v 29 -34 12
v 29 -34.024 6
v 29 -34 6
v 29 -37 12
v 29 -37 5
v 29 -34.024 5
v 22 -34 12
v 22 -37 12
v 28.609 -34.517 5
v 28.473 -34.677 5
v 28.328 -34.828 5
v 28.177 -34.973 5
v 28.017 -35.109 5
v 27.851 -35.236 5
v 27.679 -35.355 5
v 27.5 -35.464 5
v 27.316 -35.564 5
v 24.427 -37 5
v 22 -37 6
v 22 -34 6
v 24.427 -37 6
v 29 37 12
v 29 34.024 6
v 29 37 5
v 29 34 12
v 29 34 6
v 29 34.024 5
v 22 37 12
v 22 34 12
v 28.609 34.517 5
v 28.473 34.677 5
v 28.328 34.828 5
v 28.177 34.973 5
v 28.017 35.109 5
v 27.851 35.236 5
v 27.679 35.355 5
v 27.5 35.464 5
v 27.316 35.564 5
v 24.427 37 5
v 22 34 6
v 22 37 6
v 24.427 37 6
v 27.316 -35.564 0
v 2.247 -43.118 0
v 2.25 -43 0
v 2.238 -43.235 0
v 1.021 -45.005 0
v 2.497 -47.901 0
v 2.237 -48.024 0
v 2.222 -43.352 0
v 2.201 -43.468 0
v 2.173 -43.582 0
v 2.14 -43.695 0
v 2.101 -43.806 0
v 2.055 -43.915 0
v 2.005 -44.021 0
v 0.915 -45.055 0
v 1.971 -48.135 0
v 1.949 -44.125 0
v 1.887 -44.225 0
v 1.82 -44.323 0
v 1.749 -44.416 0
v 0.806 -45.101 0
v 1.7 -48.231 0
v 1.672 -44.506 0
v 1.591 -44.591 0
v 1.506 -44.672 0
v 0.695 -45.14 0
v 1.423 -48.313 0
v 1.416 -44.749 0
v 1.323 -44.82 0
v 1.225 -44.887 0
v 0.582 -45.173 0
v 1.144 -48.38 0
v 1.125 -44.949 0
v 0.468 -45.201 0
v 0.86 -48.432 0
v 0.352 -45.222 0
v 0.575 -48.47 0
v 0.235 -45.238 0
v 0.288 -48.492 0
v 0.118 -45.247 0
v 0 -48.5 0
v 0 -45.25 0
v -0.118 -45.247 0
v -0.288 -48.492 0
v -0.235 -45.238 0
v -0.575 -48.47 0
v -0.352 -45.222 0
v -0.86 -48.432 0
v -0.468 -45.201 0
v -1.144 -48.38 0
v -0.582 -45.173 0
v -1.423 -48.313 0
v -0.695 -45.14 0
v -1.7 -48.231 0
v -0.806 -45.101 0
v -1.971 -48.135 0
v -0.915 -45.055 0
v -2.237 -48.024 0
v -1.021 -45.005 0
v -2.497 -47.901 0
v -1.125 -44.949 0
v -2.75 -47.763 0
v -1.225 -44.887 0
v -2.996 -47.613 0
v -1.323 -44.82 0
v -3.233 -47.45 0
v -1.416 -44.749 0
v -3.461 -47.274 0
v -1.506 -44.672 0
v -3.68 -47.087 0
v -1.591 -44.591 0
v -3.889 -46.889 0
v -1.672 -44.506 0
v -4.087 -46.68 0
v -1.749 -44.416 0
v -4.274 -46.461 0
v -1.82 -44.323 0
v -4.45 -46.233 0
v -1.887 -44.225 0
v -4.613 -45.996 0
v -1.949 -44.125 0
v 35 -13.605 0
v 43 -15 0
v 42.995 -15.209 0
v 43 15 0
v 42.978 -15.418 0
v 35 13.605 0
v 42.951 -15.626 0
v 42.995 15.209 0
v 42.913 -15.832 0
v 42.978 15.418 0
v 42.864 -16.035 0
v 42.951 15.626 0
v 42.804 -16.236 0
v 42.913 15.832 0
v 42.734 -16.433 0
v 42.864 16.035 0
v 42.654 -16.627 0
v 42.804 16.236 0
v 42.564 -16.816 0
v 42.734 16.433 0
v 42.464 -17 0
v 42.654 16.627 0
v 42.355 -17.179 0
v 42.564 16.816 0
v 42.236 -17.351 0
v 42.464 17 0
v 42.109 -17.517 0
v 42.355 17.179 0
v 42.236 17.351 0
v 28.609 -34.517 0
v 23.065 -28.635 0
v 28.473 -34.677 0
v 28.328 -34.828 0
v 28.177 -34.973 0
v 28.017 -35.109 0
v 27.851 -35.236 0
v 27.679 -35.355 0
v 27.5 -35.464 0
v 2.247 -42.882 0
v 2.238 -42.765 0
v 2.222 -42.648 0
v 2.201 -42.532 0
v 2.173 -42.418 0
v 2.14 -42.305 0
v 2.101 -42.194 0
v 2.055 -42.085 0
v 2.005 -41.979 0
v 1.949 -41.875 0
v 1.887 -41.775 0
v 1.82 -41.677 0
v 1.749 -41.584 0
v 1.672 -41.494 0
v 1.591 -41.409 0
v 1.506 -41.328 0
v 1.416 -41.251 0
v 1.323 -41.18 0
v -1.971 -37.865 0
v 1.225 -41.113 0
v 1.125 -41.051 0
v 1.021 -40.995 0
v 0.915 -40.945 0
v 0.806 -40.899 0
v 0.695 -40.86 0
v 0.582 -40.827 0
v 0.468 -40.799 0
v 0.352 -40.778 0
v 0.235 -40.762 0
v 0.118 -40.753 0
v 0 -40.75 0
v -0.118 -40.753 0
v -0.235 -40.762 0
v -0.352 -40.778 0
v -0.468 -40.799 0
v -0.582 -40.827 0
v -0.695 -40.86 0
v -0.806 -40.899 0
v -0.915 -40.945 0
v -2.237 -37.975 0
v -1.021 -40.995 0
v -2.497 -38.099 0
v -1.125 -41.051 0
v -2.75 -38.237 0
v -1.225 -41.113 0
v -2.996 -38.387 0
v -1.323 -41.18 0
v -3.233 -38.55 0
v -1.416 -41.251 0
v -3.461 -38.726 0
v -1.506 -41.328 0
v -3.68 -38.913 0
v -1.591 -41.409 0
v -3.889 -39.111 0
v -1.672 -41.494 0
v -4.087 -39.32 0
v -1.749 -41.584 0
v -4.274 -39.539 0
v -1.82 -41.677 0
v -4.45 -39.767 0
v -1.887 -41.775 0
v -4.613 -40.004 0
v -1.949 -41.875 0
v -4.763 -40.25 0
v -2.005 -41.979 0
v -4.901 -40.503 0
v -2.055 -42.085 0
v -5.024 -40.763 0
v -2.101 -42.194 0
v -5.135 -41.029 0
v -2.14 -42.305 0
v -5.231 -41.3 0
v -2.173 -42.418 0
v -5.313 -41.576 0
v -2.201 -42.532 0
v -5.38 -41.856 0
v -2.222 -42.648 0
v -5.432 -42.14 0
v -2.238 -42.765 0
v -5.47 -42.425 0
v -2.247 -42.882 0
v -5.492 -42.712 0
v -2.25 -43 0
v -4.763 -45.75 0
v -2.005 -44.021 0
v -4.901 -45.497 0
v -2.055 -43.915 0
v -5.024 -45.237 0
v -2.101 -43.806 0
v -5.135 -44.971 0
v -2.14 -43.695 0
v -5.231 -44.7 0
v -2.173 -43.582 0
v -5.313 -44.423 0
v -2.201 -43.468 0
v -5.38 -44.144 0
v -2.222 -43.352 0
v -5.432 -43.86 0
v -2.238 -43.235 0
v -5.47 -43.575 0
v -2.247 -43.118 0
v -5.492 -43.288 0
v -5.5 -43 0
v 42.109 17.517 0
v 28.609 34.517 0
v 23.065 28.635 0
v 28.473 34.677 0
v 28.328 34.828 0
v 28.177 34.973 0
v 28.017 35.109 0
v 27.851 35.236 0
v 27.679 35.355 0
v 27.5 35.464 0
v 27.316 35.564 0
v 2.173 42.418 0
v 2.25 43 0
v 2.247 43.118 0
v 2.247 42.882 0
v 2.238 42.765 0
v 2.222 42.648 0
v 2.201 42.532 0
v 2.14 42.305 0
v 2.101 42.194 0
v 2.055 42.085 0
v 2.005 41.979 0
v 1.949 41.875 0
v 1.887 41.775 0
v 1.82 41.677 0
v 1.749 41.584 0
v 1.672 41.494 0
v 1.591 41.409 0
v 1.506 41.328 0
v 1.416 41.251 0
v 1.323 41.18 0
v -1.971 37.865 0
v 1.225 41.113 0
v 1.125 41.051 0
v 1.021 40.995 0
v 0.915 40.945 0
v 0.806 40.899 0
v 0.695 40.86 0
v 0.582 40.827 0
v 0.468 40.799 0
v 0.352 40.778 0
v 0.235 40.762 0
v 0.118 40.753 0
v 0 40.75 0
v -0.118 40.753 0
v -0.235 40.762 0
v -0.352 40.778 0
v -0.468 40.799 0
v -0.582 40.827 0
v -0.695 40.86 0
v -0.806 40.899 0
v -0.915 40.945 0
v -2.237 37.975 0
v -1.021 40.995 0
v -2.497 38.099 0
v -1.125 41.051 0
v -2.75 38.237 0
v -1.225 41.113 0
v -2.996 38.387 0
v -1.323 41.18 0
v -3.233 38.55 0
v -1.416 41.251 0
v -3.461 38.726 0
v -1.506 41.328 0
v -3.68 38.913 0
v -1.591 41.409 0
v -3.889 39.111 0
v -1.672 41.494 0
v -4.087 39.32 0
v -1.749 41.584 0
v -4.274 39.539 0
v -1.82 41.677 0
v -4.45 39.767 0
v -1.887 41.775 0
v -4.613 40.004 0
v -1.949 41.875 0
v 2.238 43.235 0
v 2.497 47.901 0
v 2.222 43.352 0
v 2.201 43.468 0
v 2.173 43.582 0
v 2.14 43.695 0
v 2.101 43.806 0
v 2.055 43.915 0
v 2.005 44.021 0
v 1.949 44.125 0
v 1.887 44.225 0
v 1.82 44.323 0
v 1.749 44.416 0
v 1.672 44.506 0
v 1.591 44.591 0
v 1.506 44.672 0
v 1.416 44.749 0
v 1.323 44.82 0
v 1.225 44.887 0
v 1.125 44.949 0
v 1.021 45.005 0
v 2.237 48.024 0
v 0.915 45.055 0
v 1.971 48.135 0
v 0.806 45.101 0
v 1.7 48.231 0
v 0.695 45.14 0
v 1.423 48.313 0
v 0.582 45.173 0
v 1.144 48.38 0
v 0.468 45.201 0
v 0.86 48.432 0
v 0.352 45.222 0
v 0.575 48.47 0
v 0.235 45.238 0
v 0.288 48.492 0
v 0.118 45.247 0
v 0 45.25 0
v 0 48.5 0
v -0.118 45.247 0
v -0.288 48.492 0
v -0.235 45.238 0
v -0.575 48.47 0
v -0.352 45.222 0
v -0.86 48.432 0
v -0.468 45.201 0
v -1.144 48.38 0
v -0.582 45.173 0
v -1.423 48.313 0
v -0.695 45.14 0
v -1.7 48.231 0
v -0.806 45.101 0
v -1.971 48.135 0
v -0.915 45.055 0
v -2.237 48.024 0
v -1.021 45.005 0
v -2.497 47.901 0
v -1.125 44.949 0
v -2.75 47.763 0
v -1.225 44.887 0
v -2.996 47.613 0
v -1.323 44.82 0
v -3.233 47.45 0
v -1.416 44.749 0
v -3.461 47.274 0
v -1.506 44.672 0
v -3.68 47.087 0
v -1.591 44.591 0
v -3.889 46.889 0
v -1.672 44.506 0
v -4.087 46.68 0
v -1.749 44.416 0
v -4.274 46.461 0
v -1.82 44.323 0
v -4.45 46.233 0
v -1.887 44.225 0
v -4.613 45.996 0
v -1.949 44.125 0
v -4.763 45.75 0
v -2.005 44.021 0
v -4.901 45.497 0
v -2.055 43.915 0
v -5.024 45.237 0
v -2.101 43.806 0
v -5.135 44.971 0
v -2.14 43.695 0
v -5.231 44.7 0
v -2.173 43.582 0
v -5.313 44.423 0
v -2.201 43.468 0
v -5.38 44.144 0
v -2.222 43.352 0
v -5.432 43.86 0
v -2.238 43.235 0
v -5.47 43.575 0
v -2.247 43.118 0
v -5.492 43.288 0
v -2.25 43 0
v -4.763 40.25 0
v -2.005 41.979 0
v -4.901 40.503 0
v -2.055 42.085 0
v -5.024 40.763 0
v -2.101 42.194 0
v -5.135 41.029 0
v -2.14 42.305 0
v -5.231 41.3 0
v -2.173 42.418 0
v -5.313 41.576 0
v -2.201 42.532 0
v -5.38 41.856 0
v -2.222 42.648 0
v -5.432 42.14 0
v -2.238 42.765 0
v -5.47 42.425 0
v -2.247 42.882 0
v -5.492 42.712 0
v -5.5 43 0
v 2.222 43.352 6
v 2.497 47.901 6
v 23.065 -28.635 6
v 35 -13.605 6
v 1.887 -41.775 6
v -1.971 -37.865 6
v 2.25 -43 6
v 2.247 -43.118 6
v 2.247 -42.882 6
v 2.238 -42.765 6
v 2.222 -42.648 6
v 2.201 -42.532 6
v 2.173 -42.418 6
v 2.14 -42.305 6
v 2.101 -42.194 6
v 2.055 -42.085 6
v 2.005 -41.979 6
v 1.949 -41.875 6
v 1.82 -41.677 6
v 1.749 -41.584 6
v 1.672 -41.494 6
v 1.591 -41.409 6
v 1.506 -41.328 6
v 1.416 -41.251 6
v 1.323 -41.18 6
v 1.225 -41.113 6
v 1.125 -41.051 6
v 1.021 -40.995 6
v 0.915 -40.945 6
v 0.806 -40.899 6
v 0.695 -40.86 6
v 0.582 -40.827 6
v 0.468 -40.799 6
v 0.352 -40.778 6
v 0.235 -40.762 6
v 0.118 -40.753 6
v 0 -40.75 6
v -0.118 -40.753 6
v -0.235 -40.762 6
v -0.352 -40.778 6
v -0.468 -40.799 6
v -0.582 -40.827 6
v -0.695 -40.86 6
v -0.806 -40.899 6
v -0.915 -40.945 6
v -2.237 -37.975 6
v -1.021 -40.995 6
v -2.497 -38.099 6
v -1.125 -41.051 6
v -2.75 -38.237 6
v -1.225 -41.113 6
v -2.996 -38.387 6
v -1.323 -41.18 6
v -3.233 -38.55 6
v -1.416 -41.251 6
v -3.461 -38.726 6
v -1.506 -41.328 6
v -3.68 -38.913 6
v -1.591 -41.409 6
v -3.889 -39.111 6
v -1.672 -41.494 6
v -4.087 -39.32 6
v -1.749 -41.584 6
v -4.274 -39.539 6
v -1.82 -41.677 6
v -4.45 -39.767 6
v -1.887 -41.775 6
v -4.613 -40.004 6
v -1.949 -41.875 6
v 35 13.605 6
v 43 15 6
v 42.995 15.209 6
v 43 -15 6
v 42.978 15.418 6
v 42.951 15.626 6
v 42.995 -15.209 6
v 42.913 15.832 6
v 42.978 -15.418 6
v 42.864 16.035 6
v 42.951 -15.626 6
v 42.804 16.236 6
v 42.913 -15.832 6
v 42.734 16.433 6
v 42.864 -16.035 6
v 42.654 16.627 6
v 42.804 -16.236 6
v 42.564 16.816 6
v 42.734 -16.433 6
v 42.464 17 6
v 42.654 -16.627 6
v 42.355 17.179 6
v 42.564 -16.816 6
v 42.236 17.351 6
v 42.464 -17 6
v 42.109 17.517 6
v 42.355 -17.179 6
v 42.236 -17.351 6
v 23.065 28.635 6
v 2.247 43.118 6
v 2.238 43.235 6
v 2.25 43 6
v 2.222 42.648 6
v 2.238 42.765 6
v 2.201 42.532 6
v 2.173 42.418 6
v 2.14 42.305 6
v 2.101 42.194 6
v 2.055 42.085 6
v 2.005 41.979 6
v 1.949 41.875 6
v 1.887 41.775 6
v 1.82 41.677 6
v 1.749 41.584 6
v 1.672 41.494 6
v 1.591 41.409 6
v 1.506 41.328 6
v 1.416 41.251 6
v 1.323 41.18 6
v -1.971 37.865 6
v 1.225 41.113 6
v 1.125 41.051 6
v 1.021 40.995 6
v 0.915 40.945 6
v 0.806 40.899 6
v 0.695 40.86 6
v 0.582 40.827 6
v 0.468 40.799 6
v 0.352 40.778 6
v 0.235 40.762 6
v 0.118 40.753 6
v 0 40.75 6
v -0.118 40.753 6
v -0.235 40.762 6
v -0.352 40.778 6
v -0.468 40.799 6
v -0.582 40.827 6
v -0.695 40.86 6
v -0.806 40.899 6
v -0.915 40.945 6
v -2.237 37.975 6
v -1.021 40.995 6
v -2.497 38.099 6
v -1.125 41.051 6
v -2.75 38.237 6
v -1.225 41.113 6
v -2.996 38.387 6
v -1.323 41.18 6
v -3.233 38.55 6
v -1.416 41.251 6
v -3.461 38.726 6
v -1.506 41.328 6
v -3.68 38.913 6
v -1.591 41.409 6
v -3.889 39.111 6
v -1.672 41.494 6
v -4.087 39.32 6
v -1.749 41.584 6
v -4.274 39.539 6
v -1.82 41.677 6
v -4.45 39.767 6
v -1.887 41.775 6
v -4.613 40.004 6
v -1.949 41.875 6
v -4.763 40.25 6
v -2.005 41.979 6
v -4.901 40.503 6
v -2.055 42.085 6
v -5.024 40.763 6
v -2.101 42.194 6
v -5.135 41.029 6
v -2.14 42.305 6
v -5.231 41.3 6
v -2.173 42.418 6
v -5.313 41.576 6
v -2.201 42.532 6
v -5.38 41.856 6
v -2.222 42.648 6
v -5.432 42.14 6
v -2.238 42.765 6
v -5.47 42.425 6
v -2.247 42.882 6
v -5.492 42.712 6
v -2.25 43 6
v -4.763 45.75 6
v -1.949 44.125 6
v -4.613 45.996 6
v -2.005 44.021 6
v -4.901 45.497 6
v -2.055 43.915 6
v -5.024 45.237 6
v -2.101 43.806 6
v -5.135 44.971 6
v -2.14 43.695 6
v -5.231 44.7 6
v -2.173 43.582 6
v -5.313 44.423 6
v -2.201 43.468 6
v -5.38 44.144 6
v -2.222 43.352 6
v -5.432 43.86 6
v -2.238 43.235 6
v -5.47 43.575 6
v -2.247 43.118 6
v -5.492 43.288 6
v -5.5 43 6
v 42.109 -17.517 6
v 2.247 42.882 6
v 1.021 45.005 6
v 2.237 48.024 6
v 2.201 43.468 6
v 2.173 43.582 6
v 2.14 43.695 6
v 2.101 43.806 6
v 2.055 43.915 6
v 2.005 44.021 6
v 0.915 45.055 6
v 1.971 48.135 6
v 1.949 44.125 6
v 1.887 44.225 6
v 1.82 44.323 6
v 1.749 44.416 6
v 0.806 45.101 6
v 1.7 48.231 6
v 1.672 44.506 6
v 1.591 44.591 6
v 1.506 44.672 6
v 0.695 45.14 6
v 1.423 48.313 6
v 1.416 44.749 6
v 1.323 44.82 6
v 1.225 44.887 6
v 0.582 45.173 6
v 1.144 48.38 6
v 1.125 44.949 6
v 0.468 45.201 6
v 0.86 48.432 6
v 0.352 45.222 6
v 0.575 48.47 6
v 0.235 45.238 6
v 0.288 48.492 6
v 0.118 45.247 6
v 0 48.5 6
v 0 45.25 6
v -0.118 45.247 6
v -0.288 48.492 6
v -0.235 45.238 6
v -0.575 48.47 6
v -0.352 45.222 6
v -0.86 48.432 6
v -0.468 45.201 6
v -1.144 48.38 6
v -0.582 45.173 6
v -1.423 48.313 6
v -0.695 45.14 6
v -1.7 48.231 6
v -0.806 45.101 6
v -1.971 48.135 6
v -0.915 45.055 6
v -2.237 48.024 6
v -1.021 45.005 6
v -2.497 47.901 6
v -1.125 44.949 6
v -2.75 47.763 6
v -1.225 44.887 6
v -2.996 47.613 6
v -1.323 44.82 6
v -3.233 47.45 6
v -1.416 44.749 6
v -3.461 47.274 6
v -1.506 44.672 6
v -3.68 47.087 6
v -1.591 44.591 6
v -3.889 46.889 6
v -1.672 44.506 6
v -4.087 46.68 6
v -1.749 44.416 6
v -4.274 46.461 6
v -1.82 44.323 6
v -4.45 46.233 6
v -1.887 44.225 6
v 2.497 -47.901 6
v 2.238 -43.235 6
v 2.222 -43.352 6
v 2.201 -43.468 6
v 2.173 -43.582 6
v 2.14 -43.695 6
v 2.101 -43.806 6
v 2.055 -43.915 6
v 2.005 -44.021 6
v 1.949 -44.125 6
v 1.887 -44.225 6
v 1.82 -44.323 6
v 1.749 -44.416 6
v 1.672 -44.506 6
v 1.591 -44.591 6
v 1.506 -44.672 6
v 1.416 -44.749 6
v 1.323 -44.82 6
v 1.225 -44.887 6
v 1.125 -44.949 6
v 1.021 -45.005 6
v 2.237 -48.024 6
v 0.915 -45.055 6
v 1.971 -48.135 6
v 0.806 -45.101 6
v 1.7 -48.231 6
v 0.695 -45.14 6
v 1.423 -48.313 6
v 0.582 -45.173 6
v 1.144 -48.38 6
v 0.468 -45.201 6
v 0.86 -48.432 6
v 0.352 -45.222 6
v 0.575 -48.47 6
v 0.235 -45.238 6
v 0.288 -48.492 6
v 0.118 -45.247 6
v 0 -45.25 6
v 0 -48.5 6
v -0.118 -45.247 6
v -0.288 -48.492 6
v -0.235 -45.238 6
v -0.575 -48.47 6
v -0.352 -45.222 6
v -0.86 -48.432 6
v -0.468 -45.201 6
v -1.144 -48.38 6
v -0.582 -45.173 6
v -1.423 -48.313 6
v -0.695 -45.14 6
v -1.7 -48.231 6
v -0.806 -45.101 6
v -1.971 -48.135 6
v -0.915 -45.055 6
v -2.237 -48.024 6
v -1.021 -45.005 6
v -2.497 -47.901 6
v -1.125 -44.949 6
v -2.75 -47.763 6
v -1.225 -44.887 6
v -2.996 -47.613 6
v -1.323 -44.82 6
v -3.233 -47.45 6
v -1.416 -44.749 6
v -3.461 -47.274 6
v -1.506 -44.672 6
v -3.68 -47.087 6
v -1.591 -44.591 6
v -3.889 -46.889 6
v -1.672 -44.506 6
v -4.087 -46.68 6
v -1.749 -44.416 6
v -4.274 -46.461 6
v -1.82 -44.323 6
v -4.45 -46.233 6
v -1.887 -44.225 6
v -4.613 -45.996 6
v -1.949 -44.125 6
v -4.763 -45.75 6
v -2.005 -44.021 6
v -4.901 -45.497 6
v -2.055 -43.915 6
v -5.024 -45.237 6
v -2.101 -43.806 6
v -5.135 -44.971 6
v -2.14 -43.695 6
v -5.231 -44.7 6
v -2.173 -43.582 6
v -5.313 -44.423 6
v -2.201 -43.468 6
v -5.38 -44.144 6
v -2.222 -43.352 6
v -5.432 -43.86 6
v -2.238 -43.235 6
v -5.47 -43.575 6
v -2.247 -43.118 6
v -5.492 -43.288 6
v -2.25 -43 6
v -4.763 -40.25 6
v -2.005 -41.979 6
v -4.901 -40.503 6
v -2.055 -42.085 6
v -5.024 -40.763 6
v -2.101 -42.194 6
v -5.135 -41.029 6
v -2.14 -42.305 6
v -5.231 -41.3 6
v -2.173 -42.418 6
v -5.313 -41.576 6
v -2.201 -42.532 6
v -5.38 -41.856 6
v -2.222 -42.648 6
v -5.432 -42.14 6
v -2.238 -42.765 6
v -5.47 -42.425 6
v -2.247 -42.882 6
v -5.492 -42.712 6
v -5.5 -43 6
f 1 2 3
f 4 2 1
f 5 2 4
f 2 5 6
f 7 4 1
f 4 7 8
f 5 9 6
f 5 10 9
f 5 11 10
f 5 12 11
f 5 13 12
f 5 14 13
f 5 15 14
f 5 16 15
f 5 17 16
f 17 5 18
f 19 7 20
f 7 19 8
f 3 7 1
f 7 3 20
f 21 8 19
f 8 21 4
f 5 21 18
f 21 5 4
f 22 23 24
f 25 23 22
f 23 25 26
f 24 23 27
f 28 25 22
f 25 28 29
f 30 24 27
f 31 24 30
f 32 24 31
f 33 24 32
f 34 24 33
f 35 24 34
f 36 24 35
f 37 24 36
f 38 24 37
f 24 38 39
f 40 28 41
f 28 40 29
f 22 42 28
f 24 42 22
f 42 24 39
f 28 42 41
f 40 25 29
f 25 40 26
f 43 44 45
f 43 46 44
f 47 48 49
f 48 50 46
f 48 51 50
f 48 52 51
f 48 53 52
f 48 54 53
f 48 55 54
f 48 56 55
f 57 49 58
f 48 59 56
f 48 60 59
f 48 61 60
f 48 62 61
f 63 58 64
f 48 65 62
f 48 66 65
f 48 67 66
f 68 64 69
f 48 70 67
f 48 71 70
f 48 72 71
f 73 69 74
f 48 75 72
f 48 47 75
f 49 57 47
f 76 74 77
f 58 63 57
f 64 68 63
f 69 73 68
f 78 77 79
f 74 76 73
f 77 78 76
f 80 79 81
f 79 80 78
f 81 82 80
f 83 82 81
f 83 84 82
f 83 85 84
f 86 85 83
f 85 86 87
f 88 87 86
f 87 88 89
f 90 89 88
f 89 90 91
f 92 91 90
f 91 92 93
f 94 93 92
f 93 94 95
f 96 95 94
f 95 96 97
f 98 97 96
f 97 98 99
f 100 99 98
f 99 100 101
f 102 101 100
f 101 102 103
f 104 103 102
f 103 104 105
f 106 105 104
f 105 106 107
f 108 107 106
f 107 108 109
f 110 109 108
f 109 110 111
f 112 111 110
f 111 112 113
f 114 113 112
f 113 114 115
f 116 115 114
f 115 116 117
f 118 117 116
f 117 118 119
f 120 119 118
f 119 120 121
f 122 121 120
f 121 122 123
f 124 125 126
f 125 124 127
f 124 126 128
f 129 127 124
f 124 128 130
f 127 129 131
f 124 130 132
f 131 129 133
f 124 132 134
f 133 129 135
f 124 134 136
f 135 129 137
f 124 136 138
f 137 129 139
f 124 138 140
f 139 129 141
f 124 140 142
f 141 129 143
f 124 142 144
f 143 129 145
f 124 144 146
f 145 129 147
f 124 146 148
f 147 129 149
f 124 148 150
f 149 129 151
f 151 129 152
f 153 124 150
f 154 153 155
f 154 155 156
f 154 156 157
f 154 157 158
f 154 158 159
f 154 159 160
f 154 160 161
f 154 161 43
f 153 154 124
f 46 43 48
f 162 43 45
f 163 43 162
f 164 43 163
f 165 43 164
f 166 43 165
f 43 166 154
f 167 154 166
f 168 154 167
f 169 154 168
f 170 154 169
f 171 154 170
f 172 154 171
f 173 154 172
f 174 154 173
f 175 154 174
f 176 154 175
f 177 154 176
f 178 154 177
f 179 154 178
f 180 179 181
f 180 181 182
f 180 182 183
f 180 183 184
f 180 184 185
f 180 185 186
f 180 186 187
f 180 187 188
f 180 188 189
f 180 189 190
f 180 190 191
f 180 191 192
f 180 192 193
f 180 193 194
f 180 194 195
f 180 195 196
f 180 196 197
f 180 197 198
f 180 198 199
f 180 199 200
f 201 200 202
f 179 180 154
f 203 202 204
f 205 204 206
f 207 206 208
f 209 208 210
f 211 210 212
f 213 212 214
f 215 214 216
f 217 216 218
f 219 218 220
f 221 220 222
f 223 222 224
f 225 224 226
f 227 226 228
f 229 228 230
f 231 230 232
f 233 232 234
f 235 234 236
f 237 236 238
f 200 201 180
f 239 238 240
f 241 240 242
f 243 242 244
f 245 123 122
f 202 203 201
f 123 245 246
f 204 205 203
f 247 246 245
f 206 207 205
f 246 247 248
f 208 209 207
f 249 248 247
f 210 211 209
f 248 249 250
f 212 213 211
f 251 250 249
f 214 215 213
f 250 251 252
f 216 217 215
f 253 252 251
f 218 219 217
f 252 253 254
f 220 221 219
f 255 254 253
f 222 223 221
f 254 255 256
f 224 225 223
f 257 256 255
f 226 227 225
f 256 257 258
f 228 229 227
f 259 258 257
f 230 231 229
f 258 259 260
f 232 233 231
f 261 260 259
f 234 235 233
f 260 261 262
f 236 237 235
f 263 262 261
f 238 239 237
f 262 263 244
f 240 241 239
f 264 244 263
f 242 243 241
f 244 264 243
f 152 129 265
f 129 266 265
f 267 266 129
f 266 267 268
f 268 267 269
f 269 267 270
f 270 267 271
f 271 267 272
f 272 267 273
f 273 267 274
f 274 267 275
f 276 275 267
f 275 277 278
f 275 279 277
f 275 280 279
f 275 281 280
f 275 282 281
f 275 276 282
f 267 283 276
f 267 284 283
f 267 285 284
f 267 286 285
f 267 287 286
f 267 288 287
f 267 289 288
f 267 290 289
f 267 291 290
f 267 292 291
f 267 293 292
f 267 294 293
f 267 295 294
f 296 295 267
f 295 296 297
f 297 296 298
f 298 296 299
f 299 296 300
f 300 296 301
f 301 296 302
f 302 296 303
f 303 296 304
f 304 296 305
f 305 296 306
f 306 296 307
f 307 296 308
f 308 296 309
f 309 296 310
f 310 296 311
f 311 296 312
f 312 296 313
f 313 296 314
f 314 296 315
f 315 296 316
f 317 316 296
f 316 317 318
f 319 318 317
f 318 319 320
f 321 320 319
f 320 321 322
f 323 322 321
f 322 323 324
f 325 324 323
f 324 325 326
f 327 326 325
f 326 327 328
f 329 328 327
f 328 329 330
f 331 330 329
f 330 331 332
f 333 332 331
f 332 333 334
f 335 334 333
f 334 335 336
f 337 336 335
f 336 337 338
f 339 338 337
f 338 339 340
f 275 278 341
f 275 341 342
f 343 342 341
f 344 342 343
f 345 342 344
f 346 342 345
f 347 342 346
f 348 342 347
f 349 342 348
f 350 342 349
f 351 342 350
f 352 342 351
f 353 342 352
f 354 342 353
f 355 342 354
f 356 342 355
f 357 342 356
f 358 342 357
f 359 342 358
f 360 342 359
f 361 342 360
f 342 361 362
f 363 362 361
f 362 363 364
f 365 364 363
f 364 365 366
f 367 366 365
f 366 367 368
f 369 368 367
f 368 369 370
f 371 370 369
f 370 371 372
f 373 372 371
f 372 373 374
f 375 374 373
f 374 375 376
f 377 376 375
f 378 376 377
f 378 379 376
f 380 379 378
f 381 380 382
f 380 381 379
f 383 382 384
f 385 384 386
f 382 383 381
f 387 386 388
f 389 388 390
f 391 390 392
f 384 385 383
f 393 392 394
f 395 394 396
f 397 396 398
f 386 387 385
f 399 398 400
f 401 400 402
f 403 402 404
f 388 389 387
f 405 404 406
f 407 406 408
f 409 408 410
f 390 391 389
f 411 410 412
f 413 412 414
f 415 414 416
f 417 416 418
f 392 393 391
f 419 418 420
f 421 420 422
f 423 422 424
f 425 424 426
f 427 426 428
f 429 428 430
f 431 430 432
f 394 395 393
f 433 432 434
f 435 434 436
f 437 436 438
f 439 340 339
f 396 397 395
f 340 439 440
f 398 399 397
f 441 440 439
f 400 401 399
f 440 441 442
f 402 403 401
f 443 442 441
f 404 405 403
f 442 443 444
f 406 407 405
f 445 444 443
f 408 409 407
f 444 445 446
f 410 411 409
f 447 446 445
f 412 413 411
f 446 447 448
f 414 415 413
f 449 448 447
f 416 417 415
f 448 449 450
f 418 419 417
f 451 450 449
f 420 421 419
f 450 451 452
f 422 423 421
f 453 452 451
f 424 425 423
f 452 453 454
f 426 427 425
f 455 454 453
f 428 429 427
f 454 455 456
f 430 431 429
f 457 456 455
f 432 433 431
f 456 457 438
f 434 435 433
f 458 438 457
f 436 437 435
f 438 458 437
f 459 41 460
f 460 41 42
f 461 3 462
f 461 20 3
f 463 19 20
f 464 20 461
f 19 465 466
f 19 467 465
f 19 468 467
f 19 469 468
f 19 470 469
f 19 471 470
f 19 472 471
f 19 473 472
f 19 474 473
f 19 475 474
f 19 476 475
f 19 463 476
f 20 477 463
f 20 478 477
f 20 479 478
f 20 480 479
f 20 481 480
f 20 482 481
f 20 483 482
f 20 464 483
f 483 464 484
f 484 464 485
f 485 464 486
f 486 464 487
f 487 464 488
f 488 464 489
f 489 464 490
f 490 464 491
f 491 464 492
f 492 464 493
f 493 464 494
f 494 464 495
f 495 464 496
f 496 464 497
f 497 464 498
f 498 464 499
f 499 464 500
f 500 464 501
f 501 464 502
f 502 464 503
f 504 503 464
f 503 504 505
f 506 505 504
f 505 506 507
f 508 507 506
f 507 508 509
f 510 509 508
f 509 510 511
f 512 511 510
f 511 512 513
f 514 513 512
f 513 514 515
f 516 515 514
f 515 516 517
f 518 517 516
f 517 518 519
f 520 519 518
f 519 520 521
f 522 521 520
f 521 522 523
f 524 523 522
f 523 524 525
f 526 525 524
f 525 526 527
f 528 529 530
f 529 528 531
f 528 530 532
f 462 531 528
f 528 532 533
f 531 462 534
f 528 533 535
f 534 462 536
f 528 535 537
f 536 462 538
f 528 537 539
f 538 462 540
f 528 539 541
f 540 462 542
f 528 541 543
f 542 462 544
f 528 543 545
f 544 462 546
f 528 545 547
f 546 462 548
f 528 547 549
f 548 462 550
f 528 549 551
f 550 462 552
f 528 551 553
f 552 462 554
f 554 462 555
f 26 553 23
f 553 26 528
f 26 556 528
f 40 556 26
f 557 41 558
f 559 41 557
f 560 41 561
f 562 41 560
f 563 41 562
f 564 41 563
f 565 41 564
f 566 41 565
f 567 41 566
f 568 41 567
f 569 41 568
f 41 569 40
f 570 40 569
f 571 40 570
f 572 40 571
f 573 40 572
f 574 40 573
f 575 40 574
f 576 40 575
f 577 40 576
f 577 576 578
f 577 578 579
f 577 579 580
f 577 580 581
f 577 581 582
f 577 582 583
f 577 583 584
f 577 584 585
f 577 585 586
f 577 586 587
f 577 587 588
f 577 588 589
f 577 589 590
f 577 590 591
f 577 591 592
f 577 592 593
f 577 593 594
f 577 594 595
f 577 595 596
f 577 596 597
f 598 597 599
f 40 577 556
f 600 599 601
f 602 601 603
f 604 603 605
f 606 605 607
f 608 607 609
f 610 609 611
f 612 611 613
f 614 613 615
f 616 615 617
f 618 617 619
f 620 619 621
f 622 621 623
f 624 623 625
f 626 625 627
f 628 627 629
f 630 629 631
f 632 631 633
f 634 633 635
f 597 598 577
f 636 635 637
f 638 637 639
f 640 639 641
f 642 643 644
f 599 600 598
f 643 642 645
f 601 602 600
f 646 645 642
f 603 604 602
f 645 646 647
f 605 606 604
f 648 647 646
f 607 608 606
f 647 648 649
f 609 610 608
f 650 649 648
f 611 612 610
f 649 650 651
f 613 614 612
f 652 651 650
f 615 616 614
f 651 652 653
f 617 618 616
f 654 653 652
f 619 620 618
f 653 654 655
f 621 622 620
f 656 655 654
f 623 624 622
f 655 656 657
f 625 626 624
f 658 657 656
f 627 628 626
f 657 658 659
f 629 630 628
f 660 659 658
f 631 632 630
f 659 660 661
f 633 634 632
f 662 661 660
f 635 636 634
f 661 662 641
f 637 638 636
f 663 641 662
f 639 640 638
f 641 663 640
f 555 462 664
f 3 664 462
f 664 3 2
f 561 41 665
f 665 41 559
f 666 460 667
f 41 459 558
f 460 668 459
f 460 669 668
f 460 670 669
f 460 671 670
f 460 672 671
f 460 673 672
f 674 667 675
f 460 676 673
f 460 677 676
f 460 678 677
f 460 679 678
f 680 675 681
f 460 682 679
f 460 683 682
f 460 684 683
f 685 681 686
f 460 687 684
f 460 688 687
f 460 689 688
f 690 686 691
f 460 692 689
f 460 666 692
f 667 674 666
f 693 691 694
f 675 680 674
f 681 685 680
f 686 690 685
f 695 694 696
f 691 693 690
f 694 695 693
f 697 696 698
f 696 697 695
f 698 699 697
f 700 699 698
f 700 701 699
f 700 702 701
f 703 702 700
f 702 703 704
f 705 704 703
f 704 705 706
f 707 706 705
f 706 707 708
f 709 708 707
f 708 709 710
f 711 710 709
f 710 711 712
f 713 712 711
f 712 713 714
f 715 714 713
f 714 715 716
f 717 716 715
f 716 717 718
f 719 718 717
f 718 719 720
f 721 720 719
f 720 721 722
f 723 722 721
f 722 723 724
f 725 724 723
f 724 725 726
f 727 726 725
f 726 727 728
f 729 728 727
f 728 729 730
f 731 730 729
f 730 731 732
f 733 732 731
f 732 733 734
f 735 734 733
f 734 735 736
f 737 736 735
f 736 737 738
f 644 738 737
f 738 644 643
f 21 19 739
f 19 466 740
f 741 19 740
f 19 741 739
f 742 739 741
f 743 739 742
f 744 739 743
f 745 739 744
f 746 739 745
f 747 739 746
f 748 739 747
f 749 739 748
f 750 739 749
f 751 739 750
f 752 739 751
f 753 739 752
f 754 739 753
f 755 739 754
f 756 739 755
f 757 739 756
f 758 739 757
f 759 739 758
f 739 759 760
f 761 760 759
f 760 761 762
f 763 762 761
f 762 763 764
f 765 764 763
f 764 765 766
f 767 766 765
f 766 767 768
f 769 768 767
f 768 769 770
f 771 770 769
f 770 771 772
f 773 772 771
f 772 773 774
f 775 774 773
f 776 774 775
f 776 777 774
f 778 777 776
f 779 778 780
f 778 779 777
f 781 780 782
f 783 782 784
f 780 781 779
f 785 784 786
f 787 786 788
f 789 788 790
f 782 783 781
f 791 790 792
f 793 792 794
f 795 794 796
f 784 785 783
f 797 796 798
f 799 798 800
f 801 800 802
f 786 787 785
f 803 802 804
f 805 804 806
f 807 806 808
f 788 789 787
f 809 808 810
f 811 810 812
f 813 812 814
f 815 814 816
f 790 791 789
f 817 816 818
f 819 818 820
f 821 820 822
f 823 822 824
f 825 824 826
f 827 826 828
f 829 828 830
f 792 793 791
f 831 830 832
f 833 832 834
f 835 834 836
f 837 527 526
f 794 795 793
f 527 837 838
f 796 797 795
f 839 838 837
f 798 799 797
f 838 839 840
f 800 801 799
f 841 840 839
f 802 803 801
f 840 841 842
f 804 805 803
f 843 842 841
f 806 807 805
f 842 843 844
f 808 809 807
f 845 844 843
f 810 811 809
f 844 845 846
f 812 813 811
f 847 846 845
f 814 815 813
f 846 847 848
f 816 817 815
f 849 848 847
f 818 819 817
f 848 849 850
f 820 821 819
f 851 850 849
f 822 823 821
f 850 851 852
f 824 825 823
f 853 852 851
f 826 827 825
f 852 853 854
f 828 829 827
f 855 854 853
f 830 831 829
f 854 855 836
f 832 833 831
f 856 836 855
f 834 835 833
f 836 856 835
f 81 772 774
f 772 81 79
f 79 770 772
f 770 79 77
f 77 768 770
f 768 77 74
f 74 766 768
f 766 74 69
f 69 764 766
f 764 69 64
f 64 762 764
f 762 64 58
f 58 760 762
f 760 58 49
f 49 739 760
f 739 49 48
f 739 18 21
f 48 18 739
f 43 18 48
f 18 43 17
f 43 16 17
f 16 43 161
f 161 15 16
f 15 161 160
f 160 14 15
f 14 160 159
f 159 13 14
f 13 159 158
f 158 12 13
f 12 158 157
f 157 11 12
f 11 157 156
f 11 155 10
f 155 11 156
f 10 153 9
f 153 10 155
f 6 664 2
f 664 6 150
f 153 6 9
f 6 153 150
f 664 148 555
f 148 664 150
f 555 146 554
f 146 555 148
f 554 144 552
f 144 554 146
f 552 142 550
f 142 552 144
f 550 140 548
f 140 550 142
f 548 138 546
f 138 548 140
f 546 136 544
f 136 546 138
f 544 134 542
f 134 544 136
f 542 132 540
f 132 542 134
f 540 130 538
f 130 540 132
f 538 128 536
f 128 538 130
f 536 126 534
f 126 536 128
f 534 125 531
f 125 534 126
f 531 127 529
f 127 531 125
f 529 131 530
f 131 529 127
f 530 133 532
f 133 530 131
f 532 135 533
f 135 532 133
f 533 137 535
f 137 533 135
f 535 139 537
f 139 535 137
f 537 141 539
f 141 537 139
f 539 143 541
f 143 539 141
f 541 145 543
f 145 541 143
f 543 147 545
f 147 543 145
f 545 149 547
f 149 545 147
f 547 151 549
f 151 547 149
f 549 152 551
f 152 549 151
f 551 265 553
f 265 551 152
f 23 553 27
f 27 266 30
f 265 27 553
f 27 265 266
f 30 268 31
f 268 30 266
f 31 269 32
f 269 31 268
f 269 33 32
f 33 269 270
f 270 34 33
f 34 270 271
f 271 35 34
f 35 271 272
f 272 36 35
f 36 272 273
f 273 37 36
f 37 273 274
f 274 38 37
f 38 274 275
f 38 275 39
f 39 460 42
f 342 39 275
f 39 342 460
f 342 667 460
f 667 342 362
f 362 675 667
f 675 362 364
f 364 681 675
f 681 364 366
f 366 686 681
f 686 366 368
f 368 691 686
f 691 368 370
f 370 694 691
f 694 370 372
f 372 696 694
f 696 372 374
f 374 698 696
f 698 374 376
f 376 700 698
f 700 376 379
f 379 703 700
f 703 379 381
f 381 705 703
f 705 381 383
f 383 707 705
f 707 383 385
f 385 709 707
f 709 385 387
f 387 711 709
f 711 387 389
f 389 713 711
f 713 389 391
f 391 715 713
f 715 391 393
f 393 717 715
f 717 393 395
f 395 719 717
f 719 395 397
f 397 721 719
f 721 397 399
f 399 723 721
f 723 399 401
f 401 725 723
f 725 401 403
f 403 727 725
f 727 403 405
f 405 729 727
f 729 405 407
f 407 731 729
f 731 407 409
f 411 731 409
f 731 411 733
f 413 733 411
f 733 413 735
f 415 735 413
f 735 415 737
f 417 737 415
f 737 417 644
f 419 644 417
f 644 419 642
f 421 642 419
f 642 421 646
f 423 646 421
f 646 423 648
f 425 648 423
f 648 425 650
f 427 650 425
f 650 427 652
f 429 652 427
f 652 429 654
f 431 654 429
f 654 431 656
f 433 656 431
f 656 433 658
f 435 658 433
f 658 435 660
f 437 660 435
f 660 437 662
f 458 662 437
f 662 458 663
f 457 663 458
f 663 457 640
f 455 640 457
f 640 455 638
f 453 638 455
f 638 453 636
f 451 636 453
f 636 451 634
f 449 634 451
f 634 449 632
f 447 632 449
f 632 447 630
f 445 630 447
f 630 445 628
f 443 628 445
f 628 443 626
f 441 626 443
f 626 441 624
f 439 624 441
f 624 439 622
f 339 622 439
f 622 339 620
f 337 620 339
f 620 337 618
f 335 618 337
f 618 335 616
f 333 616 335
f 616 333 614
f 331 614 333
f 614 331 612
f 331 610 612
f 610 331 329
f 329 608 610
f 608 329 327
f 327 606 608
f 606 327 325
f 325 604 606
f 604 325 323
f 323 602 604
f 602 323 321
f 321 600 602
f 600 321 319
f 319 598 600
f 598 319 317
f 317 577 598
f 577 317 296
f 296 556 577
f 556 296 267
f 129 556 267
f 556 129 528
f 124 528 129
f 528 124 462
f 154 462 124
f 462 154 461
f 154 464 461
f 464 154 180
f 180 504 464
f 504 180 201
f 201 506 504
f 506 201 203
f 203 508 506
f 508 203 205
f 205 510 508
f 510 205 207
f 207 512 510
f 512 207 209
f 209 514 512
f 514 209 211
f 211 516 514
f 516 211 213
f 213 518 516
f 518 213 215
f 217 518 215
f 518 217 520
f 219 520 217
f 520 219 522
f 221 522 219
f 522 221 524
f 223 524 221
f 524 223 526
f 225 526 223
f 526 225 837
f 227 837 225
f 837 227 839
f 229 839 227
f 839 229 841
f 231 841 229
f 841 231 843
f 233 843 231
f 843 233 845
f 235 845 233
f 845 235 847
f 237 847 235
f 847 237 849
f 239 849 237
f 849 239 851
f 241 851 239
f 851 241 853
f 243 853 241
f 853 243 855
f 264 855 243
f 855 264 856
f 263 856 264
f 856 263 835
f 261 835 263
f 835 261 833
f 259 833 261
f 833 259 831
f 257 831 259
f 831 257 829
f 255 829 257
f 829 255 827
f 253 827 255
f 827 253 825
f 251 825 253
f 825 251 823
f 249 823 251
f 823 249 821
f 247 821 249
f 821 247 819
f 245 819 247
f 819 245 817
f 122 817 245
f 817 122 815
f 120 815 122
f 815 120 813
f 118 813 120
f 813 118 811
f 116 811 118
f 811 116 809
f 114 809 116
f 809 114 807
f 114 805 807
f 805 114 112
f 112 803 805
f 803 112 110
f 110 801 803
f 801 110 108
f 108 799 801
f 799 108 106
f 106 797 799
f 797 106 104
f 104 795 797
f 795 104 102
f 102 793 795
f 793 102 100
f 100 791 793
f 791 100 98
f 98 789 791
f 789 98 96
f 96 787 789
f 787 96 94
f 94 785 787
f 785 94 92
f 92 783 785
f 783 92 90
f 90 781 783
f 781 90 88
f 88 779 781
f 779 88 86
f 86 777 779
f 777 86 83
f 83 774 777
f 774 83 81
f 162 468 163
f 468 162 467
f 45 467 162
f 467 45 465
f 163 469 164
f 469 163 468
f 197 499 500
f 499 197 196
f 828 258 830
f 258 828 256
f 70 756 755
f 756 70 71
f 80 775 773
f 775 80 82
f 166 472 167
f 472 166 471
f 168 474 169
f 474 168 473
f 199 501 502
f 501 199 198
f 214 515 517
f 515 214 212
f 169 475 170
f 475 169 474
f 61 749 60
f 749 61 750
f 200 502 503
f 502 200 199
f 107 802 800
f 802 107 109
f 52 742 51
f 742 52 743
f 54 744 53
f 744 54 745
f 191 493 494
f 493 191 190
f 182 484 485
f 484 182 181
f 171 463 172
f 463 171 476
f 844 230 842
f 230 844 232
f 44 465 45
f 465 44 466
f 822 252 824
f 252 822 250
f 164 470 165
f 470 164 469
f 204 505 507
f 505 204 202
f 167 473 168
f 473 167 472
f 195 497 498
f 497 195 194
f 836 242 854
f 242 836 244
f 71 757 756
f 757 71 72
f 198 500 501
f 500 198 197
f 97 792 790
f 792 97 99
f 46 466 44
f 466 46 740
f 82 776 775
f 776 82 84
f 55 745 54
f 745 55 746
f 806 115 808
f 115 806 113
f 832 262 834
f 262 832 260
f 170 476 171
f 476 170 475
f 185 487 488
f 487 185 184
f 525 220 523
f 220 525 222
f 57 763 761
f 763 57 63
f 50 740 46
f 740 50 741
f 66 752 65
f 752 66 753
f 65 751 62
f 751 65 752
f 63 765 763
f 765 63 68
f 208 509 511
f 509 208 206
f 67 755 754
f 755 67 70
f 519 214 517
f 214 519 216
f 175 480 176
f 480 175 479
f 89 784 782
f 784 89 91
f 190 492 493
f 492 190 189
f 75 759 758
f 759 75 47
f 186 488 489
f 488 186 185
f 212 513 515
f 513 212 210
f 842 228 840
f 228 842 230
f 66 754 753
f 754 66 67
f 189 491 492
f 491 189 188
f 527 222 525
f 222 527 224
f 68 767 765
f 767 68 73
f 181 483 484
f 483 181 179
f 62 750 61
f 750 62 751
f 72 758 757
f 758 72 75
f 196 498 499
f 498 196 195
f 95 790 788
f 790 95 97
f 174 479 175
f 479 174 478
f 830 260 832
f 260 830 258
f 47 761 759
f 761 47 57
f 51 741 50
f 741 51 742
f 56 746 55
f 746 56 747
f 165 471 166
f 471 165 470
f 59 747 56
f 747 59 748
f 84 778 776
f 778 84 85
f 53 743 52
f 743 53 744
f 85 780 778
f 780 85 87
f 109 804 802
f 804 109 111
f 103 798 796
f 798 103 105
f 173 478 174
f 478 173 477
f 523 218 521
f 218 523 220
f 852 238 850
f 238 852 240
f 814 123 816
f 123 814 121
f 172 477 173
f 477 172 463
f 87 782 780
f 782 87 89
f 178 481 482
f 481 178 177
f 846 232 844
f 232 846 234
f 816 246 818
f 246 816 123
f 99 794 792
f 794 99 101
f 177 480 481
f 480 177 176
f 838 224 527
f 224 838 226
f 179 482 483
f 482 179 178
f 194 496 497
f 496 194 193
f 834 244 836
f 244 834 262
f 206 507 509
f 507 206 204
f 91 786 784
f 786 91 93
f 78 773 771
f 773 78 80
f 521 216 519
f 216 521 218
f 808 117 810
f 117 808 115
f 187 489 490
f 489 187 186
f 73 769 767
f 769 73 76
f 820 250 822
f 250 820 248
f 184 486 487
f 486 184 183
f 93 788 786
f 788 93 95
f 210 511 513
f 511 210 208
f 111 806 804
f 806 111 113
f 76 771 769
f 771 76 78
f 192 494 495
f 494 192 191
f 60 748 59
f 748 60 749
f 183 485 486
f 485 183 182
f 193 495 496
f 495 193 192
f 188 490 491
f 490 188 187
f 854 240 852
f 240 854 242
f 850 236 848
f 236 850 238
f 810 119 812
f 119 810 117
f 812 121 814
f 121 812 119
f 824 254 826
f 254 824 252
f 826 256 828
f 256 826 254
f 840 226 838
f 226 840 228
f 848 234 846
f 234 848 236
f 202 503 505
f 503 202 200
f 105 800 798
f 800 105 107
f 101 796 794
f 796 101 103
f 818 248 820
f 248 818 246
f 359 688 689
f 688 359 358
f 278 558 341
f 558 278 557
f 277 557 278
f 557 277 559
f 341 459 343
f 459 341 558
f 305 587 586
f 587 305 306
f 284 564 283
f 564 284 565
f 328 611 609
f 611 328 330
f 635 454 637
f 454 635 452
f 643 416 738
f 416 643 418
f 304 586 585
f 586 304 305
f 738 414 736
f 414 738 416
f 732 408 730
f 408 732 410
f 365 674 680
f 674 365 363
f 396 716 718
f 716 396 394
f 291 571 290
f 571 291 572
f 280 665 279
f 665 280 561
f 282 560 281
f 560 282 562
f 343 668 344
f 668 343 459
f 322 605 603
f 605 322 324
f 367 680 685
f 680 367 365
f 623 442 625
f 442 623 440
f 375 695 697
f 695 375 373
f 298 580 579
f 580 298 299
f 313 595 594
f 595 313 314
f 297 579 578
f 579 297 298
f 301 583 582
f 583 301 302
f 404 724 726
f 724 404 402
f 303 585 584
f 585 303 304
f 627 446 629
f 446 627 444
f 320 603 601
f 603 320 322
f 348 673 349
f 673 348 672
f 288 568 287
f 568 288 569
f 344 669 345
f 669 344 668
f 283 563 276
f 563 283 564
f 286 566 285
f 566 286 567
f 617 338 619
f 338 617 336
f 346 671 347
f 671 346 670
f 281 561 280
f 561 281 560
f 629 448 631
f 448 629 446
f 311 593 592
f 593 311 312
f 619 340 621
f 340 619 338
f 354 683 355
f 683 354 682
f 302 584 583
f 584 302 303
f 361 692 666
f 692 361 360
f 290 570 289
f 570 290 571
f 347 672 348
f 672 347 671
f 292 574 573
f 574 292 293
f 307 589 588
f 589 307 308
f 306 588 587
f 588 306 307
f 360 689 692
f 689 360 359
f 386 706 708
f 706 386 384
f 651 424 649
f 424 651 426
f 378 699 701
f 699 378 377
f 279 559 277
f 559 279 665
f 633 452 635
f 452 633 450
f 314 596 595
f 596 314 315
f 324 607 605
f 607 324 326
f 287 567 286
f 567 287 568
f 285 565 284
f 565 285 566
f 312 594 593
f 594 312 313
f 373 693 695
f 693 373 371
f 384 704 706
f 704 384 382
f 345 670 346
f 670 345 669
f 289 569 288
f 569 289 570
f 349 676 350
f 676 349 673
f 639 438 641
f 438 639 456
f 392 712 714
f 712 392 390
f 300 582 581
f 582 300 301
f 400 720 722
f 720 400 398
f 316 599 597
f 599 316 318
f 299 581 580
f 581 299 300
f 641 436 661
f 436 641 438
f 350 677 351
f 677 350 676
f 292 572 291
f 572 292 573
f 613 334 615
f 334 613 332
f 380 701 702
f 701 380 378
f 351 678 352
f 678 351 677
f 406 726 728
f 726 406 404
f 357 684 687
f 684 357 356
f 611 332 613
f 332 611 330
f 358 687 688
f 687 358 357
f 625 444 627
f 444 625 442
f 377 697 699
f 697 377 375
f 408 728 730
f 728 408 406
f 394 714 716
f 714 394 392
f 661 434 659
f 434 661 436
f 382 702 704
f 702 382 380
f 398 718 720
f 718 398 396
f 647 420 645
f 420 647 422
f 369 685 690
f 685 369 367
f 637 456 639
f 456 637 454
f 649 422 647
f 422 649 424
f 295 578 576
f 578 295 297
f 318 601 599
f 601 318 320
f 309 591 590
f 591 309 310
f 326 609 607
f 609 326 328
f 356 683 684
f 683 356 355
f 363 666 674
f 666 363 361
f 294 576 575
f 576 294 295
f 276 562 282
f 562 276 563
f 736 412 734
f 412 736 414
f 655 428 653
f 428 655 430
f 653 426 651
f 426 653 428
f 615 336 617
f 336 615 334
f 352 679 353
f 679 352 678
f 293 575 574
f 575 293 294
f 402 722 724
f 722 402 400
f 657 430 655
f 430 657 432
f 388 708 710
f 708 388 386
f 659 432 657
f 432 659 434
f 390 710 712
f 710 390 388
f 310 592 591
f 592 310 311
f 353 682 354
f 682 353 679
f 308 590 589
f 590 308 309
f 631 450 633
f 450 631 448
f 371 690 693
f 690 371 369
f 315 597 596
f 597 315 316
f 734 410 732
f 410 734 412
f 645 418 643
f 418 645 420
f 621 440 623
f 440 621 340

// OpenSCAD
// Rev F | mm | Rev E front insert retained.
// Middle: print flat, fingers up. Install fingers facing the battery.
// Rear: print flat. Add thin rigid pads against the battery shell and use
// washers and locknuts to adjust axial fit on both M4 rods.
// Pull loop: fit a flexible webbing loop with reinforced M4 eyelets under
// washers and locknuts at the access-side rod ends. Keep loop clear of DIN
// Base, USB and the cap seal. Use metal hardware for the pull load.
// Handle tabs shown in preview are only geometry mockups.
// Front plate, battery envelopes and cap clearances require physical fit checks.
part = "middle";
bore_min = 103;
diametral_gap = 1.0;
length_axial = 40;
land_width = 8;
ring_wall = 6;
shell_wall = 7;
mid_relief = 0.35; // Radial relief between the two pipe-contact lands
rod_tube_od = 13;
deck_thickness = 10;
standoff_height = 4;
spacer_od = 9;
spacer_bore = 3.6;
screw_clearance = 3.4;
lead_chamfer = 0.7;


battery_length = 113;
rod_y = 43;
rod_hole = 4.5;
ear_radius = 5.5;
saddle_thickness = 6;
finger_length = 6;
finger_inner_y = 34; // Photo estimate, measured from tube axis
finger_width = 3;
finger_x = 22; // Contacts at battery side only
finger_depth_x = 7;
front_cable_gap = 30;
end_pad = 1;
rear_thickness = 14;
middle_bridge_x = 39;
middle_bridge_radius = 4;
handle_tab_od = 11;
handle_tab_length = 19;
handle_tab_thickness = 4;

$fn = 120;
r = (bore_min - diametral_gap) / 2;
body_length = length_axial - standoff_height;
hole_centers = [for (x = [-15, 15], y = [-31, 31]) [x, y]];
rod_positions = [-rod_y, rod_y];
pack_front = -front_cable_gap;
pack_back = pack_front - battery_length;
rear_start = pack_back - end_pad - rear_thickness;

assert(part == "middle" || part == "handle_tab" || part == "front" || part == "rear" ||
       part == "gauge" || part == "spacer" || part == "assembly", "Unknown part.");
assert(rod_y + rod_tube_od / 2 <= r - lead_chamfer,
       "Rod sleeves exceed the entry chamfer.");
assert(rod_y + rod_tube_od / 2 > r - mid_relief - shell_wall,
       "Rod sleeves must overlap the sidewall.");
assert(2 * (land_width + mid_relief) < body_length && deck_thickness < body_length,
       "Check front insert axial dimensions.");
assert(rod_y + ear_radius < r - lead_chamfer, "Rod ears exceed fit diameter.");
assert(norm([finger_x + finger_depth_x, finger_inner_y + finger_width]) < r,
       "Locating fingers exceed fit diameter.");
assert(rod_y - rod_hole / 2 > 31 + screw_clearance / 2,
       "Check DIN mounting hole clearance.");

echo(guide_od = 2 * r, rod_spacing = 2 * rod_y,
     assembly_length_excluding_device_and_hardware = length_axial - rear_start);

module rod_bores(start, depth) {
    for (y = rod_positions)
        translate([0, y, start])
            cylinder(d = rod_hole, h = depth);
}

module end_land() {
    cylinder(h = lead_chamfer, r1 = r - lead_chamfer, r2 = r);
    translate([0, 0, lead_chamfer])
        cylinder(h = land_width - 2 * lead_chamfer, r = r);
    translate([0, 0, land_width - lead_chamfer])
        cylinder(h = lead_chamfer, r1 = r, r2 = r - lead_chamfer);
}

module annular_land() {
    difference() {
        end_land();
        translate([0, 0, -1])
            cylinder(h = land_width + 2, r = r - ring_wall);
    }
}

// Continuous wall carries transverse shear and torsion between the lands.
module front_outer_profile() {
    rotate_extrude()
        polygon([
            [0, 0], [r - lead_chamfer, 0], [r, lead_chamfer],
            [r, land_width], [r - mid_relief, land_width + mid_relief],
            [r - mid_relief, body_length - land_width - mid_relief],
            [r, body_length - land_width], [r, body_length - lead_chamfer],
            [r - lead_chamfer, body_length], [0, body_length]
        ]);
}

module insert() {
    difference() {
        union() {
            difference() {
                front_outer_profile();
                translate([0, 0, -1])
                    cylinder(h = body_length - deck_thickness + 1,
                             r = r - mid_relief - shell_wall);
            }
            // Full-height sleeves merge into the wall and support M4 clamping.
            for (y = rod_positions)
                translate([0, y, 0])
                    cylinder(h = body_length, d = rod_tube_od);
        }
        for (p = hole_centers)
            translate([p[0], p[1], body_length - deck_thickness - 1])
                cylinder(h = deck_thickness + 2,
                         d = screw_clearance);
        rod_bores(-1, body_length + 2);
        // Rounded corners reduce stress concentration at the cable window.
        translate([0, 0, body_length - deck_thickness - 1])
            linear_extrude(height = deck_thickness + 2)
                hull() for (x = [-10, 10], y = [-7, 7])
                    translate([x, y]) circle(r = 2);
    }
}

module rear_plate() {
    difference() {
        rotate_extrude()
            polygon([[0, 0], [r-lead_chamfer, 0], [r, lead_chamfer],
                     [r, rear_thickness-lead_chamfer],
                     [r-lead_chamfer, rear_thickness], [0, rear_thickness]]);
        rod_bores(-1, rear_thickness + 2);
    }
}

module middle_bracket() {
    difference() {
        union() {
            linear_extrude(height = saddle_thickness)
                union() {
                    // Move the bridge to the right of the battery indicator.
                    hull() for (side = [-1, 1])
                        translate([middle_bridge_x, side * 15])
                            circle(r = middle_bridge_radius);
                    for (side = [-1, 1]) {
                        hull() {
                            translate([0, side * rod_y]) circle(r = ear_radius);
                            translate([finger_x + finger_depth_x/2,
                                       side * (finger_inner_y - 2)]) circle(r = 4);
                        }
                        hull() {
                            translate([finger_x + finger_depth_x/2,
                                       side * (finger_inner_y - 2)]) circle(r = 4);
                            translate([middle_bridge_x, side * 15])
                                circle(r = middle_bridge_radius);
                        }
                    }
                }
            for (side = [-1, 1])
                translate([finger_x,
                           side > 0 ? finger_inner_y : -finger_inner_y-finger_width,
                           saddle_thickness - 1])
                    cube([finger_depth_x, finger_width, finger_length + 1]);
        }
        rod_bores(-1, saddle_thickness + 2);
    }
}

// Optional geometry mockup. For loaded trials use metal M4 eye tabs
// or a webbing pull loop with metal eyelets captured on the rod ends.
module handle_tab() {
    linear_extrude(height = handle_tab_thickness)
        difference() {
            hull() for (x = [0, handle_tab_length])
                translate([x, 0]) circle(d = handle_tab_od);
            circle(d = rod_hole);
            translate([handle_tab_length, 0]) circle(d = 5);
        }
}

module spacer() {
    difference() {
        cylinder(d = spacer_od, h = standoff_height);
        translate([0, 0, -1])
            cylinder(d = spacer_bore, h = standoff_height + 2);
    }
}

module assembly() {
    color("steelblue") insert();
    for (p = hole_centers)
        color("steelblue") translate([p[0], p[1], body_length]) spacer();
    color("steelblue") translate([0, 0, rear_start]) rear_plate();
    color("orange") translate([0, 0, pack_front + end_pad + saddle_thickness])
        rotate([180, 0, 0]) middle_bracket();
    for (y = rod_positions)
        %translate([0, y, body_length]) rotate([0, 0, y > 0 ? -90 : 90]) handle_tab();
    for (y = rod_positions)
        color("silver") translate([0, y, rear_start])
            cylinder(d = 4, h = body_length - rear_start + 12);
    // Rough end-view silhouette for orientation only.
    %translate([0, 0, pack_back])
        linear_extrude(height = battery_length)
            hull() for (x = [3, 29], y = [-28, 28])
                translate([x, y]) circle(r = 5);
    %translate([0, 0, pack_front - 102])
        linear_extrude(height = 102)
            hull() for (x = [-34, -7], y = [-27, 27])
                translate([x, y]) circle(r = 5);
}

if (part == "middle") middle_bracket();
if (part == "handle_tab") handle_tab();
if (part == "front")
    translate([0, 0, body_length]) rotate([180, 0, 0]) insert();
if (part == "spacer") spacer();
if (part == "rear") rear_plate();
if (part == "gauge") annular_land();
if (part == "assembly") assembly();
